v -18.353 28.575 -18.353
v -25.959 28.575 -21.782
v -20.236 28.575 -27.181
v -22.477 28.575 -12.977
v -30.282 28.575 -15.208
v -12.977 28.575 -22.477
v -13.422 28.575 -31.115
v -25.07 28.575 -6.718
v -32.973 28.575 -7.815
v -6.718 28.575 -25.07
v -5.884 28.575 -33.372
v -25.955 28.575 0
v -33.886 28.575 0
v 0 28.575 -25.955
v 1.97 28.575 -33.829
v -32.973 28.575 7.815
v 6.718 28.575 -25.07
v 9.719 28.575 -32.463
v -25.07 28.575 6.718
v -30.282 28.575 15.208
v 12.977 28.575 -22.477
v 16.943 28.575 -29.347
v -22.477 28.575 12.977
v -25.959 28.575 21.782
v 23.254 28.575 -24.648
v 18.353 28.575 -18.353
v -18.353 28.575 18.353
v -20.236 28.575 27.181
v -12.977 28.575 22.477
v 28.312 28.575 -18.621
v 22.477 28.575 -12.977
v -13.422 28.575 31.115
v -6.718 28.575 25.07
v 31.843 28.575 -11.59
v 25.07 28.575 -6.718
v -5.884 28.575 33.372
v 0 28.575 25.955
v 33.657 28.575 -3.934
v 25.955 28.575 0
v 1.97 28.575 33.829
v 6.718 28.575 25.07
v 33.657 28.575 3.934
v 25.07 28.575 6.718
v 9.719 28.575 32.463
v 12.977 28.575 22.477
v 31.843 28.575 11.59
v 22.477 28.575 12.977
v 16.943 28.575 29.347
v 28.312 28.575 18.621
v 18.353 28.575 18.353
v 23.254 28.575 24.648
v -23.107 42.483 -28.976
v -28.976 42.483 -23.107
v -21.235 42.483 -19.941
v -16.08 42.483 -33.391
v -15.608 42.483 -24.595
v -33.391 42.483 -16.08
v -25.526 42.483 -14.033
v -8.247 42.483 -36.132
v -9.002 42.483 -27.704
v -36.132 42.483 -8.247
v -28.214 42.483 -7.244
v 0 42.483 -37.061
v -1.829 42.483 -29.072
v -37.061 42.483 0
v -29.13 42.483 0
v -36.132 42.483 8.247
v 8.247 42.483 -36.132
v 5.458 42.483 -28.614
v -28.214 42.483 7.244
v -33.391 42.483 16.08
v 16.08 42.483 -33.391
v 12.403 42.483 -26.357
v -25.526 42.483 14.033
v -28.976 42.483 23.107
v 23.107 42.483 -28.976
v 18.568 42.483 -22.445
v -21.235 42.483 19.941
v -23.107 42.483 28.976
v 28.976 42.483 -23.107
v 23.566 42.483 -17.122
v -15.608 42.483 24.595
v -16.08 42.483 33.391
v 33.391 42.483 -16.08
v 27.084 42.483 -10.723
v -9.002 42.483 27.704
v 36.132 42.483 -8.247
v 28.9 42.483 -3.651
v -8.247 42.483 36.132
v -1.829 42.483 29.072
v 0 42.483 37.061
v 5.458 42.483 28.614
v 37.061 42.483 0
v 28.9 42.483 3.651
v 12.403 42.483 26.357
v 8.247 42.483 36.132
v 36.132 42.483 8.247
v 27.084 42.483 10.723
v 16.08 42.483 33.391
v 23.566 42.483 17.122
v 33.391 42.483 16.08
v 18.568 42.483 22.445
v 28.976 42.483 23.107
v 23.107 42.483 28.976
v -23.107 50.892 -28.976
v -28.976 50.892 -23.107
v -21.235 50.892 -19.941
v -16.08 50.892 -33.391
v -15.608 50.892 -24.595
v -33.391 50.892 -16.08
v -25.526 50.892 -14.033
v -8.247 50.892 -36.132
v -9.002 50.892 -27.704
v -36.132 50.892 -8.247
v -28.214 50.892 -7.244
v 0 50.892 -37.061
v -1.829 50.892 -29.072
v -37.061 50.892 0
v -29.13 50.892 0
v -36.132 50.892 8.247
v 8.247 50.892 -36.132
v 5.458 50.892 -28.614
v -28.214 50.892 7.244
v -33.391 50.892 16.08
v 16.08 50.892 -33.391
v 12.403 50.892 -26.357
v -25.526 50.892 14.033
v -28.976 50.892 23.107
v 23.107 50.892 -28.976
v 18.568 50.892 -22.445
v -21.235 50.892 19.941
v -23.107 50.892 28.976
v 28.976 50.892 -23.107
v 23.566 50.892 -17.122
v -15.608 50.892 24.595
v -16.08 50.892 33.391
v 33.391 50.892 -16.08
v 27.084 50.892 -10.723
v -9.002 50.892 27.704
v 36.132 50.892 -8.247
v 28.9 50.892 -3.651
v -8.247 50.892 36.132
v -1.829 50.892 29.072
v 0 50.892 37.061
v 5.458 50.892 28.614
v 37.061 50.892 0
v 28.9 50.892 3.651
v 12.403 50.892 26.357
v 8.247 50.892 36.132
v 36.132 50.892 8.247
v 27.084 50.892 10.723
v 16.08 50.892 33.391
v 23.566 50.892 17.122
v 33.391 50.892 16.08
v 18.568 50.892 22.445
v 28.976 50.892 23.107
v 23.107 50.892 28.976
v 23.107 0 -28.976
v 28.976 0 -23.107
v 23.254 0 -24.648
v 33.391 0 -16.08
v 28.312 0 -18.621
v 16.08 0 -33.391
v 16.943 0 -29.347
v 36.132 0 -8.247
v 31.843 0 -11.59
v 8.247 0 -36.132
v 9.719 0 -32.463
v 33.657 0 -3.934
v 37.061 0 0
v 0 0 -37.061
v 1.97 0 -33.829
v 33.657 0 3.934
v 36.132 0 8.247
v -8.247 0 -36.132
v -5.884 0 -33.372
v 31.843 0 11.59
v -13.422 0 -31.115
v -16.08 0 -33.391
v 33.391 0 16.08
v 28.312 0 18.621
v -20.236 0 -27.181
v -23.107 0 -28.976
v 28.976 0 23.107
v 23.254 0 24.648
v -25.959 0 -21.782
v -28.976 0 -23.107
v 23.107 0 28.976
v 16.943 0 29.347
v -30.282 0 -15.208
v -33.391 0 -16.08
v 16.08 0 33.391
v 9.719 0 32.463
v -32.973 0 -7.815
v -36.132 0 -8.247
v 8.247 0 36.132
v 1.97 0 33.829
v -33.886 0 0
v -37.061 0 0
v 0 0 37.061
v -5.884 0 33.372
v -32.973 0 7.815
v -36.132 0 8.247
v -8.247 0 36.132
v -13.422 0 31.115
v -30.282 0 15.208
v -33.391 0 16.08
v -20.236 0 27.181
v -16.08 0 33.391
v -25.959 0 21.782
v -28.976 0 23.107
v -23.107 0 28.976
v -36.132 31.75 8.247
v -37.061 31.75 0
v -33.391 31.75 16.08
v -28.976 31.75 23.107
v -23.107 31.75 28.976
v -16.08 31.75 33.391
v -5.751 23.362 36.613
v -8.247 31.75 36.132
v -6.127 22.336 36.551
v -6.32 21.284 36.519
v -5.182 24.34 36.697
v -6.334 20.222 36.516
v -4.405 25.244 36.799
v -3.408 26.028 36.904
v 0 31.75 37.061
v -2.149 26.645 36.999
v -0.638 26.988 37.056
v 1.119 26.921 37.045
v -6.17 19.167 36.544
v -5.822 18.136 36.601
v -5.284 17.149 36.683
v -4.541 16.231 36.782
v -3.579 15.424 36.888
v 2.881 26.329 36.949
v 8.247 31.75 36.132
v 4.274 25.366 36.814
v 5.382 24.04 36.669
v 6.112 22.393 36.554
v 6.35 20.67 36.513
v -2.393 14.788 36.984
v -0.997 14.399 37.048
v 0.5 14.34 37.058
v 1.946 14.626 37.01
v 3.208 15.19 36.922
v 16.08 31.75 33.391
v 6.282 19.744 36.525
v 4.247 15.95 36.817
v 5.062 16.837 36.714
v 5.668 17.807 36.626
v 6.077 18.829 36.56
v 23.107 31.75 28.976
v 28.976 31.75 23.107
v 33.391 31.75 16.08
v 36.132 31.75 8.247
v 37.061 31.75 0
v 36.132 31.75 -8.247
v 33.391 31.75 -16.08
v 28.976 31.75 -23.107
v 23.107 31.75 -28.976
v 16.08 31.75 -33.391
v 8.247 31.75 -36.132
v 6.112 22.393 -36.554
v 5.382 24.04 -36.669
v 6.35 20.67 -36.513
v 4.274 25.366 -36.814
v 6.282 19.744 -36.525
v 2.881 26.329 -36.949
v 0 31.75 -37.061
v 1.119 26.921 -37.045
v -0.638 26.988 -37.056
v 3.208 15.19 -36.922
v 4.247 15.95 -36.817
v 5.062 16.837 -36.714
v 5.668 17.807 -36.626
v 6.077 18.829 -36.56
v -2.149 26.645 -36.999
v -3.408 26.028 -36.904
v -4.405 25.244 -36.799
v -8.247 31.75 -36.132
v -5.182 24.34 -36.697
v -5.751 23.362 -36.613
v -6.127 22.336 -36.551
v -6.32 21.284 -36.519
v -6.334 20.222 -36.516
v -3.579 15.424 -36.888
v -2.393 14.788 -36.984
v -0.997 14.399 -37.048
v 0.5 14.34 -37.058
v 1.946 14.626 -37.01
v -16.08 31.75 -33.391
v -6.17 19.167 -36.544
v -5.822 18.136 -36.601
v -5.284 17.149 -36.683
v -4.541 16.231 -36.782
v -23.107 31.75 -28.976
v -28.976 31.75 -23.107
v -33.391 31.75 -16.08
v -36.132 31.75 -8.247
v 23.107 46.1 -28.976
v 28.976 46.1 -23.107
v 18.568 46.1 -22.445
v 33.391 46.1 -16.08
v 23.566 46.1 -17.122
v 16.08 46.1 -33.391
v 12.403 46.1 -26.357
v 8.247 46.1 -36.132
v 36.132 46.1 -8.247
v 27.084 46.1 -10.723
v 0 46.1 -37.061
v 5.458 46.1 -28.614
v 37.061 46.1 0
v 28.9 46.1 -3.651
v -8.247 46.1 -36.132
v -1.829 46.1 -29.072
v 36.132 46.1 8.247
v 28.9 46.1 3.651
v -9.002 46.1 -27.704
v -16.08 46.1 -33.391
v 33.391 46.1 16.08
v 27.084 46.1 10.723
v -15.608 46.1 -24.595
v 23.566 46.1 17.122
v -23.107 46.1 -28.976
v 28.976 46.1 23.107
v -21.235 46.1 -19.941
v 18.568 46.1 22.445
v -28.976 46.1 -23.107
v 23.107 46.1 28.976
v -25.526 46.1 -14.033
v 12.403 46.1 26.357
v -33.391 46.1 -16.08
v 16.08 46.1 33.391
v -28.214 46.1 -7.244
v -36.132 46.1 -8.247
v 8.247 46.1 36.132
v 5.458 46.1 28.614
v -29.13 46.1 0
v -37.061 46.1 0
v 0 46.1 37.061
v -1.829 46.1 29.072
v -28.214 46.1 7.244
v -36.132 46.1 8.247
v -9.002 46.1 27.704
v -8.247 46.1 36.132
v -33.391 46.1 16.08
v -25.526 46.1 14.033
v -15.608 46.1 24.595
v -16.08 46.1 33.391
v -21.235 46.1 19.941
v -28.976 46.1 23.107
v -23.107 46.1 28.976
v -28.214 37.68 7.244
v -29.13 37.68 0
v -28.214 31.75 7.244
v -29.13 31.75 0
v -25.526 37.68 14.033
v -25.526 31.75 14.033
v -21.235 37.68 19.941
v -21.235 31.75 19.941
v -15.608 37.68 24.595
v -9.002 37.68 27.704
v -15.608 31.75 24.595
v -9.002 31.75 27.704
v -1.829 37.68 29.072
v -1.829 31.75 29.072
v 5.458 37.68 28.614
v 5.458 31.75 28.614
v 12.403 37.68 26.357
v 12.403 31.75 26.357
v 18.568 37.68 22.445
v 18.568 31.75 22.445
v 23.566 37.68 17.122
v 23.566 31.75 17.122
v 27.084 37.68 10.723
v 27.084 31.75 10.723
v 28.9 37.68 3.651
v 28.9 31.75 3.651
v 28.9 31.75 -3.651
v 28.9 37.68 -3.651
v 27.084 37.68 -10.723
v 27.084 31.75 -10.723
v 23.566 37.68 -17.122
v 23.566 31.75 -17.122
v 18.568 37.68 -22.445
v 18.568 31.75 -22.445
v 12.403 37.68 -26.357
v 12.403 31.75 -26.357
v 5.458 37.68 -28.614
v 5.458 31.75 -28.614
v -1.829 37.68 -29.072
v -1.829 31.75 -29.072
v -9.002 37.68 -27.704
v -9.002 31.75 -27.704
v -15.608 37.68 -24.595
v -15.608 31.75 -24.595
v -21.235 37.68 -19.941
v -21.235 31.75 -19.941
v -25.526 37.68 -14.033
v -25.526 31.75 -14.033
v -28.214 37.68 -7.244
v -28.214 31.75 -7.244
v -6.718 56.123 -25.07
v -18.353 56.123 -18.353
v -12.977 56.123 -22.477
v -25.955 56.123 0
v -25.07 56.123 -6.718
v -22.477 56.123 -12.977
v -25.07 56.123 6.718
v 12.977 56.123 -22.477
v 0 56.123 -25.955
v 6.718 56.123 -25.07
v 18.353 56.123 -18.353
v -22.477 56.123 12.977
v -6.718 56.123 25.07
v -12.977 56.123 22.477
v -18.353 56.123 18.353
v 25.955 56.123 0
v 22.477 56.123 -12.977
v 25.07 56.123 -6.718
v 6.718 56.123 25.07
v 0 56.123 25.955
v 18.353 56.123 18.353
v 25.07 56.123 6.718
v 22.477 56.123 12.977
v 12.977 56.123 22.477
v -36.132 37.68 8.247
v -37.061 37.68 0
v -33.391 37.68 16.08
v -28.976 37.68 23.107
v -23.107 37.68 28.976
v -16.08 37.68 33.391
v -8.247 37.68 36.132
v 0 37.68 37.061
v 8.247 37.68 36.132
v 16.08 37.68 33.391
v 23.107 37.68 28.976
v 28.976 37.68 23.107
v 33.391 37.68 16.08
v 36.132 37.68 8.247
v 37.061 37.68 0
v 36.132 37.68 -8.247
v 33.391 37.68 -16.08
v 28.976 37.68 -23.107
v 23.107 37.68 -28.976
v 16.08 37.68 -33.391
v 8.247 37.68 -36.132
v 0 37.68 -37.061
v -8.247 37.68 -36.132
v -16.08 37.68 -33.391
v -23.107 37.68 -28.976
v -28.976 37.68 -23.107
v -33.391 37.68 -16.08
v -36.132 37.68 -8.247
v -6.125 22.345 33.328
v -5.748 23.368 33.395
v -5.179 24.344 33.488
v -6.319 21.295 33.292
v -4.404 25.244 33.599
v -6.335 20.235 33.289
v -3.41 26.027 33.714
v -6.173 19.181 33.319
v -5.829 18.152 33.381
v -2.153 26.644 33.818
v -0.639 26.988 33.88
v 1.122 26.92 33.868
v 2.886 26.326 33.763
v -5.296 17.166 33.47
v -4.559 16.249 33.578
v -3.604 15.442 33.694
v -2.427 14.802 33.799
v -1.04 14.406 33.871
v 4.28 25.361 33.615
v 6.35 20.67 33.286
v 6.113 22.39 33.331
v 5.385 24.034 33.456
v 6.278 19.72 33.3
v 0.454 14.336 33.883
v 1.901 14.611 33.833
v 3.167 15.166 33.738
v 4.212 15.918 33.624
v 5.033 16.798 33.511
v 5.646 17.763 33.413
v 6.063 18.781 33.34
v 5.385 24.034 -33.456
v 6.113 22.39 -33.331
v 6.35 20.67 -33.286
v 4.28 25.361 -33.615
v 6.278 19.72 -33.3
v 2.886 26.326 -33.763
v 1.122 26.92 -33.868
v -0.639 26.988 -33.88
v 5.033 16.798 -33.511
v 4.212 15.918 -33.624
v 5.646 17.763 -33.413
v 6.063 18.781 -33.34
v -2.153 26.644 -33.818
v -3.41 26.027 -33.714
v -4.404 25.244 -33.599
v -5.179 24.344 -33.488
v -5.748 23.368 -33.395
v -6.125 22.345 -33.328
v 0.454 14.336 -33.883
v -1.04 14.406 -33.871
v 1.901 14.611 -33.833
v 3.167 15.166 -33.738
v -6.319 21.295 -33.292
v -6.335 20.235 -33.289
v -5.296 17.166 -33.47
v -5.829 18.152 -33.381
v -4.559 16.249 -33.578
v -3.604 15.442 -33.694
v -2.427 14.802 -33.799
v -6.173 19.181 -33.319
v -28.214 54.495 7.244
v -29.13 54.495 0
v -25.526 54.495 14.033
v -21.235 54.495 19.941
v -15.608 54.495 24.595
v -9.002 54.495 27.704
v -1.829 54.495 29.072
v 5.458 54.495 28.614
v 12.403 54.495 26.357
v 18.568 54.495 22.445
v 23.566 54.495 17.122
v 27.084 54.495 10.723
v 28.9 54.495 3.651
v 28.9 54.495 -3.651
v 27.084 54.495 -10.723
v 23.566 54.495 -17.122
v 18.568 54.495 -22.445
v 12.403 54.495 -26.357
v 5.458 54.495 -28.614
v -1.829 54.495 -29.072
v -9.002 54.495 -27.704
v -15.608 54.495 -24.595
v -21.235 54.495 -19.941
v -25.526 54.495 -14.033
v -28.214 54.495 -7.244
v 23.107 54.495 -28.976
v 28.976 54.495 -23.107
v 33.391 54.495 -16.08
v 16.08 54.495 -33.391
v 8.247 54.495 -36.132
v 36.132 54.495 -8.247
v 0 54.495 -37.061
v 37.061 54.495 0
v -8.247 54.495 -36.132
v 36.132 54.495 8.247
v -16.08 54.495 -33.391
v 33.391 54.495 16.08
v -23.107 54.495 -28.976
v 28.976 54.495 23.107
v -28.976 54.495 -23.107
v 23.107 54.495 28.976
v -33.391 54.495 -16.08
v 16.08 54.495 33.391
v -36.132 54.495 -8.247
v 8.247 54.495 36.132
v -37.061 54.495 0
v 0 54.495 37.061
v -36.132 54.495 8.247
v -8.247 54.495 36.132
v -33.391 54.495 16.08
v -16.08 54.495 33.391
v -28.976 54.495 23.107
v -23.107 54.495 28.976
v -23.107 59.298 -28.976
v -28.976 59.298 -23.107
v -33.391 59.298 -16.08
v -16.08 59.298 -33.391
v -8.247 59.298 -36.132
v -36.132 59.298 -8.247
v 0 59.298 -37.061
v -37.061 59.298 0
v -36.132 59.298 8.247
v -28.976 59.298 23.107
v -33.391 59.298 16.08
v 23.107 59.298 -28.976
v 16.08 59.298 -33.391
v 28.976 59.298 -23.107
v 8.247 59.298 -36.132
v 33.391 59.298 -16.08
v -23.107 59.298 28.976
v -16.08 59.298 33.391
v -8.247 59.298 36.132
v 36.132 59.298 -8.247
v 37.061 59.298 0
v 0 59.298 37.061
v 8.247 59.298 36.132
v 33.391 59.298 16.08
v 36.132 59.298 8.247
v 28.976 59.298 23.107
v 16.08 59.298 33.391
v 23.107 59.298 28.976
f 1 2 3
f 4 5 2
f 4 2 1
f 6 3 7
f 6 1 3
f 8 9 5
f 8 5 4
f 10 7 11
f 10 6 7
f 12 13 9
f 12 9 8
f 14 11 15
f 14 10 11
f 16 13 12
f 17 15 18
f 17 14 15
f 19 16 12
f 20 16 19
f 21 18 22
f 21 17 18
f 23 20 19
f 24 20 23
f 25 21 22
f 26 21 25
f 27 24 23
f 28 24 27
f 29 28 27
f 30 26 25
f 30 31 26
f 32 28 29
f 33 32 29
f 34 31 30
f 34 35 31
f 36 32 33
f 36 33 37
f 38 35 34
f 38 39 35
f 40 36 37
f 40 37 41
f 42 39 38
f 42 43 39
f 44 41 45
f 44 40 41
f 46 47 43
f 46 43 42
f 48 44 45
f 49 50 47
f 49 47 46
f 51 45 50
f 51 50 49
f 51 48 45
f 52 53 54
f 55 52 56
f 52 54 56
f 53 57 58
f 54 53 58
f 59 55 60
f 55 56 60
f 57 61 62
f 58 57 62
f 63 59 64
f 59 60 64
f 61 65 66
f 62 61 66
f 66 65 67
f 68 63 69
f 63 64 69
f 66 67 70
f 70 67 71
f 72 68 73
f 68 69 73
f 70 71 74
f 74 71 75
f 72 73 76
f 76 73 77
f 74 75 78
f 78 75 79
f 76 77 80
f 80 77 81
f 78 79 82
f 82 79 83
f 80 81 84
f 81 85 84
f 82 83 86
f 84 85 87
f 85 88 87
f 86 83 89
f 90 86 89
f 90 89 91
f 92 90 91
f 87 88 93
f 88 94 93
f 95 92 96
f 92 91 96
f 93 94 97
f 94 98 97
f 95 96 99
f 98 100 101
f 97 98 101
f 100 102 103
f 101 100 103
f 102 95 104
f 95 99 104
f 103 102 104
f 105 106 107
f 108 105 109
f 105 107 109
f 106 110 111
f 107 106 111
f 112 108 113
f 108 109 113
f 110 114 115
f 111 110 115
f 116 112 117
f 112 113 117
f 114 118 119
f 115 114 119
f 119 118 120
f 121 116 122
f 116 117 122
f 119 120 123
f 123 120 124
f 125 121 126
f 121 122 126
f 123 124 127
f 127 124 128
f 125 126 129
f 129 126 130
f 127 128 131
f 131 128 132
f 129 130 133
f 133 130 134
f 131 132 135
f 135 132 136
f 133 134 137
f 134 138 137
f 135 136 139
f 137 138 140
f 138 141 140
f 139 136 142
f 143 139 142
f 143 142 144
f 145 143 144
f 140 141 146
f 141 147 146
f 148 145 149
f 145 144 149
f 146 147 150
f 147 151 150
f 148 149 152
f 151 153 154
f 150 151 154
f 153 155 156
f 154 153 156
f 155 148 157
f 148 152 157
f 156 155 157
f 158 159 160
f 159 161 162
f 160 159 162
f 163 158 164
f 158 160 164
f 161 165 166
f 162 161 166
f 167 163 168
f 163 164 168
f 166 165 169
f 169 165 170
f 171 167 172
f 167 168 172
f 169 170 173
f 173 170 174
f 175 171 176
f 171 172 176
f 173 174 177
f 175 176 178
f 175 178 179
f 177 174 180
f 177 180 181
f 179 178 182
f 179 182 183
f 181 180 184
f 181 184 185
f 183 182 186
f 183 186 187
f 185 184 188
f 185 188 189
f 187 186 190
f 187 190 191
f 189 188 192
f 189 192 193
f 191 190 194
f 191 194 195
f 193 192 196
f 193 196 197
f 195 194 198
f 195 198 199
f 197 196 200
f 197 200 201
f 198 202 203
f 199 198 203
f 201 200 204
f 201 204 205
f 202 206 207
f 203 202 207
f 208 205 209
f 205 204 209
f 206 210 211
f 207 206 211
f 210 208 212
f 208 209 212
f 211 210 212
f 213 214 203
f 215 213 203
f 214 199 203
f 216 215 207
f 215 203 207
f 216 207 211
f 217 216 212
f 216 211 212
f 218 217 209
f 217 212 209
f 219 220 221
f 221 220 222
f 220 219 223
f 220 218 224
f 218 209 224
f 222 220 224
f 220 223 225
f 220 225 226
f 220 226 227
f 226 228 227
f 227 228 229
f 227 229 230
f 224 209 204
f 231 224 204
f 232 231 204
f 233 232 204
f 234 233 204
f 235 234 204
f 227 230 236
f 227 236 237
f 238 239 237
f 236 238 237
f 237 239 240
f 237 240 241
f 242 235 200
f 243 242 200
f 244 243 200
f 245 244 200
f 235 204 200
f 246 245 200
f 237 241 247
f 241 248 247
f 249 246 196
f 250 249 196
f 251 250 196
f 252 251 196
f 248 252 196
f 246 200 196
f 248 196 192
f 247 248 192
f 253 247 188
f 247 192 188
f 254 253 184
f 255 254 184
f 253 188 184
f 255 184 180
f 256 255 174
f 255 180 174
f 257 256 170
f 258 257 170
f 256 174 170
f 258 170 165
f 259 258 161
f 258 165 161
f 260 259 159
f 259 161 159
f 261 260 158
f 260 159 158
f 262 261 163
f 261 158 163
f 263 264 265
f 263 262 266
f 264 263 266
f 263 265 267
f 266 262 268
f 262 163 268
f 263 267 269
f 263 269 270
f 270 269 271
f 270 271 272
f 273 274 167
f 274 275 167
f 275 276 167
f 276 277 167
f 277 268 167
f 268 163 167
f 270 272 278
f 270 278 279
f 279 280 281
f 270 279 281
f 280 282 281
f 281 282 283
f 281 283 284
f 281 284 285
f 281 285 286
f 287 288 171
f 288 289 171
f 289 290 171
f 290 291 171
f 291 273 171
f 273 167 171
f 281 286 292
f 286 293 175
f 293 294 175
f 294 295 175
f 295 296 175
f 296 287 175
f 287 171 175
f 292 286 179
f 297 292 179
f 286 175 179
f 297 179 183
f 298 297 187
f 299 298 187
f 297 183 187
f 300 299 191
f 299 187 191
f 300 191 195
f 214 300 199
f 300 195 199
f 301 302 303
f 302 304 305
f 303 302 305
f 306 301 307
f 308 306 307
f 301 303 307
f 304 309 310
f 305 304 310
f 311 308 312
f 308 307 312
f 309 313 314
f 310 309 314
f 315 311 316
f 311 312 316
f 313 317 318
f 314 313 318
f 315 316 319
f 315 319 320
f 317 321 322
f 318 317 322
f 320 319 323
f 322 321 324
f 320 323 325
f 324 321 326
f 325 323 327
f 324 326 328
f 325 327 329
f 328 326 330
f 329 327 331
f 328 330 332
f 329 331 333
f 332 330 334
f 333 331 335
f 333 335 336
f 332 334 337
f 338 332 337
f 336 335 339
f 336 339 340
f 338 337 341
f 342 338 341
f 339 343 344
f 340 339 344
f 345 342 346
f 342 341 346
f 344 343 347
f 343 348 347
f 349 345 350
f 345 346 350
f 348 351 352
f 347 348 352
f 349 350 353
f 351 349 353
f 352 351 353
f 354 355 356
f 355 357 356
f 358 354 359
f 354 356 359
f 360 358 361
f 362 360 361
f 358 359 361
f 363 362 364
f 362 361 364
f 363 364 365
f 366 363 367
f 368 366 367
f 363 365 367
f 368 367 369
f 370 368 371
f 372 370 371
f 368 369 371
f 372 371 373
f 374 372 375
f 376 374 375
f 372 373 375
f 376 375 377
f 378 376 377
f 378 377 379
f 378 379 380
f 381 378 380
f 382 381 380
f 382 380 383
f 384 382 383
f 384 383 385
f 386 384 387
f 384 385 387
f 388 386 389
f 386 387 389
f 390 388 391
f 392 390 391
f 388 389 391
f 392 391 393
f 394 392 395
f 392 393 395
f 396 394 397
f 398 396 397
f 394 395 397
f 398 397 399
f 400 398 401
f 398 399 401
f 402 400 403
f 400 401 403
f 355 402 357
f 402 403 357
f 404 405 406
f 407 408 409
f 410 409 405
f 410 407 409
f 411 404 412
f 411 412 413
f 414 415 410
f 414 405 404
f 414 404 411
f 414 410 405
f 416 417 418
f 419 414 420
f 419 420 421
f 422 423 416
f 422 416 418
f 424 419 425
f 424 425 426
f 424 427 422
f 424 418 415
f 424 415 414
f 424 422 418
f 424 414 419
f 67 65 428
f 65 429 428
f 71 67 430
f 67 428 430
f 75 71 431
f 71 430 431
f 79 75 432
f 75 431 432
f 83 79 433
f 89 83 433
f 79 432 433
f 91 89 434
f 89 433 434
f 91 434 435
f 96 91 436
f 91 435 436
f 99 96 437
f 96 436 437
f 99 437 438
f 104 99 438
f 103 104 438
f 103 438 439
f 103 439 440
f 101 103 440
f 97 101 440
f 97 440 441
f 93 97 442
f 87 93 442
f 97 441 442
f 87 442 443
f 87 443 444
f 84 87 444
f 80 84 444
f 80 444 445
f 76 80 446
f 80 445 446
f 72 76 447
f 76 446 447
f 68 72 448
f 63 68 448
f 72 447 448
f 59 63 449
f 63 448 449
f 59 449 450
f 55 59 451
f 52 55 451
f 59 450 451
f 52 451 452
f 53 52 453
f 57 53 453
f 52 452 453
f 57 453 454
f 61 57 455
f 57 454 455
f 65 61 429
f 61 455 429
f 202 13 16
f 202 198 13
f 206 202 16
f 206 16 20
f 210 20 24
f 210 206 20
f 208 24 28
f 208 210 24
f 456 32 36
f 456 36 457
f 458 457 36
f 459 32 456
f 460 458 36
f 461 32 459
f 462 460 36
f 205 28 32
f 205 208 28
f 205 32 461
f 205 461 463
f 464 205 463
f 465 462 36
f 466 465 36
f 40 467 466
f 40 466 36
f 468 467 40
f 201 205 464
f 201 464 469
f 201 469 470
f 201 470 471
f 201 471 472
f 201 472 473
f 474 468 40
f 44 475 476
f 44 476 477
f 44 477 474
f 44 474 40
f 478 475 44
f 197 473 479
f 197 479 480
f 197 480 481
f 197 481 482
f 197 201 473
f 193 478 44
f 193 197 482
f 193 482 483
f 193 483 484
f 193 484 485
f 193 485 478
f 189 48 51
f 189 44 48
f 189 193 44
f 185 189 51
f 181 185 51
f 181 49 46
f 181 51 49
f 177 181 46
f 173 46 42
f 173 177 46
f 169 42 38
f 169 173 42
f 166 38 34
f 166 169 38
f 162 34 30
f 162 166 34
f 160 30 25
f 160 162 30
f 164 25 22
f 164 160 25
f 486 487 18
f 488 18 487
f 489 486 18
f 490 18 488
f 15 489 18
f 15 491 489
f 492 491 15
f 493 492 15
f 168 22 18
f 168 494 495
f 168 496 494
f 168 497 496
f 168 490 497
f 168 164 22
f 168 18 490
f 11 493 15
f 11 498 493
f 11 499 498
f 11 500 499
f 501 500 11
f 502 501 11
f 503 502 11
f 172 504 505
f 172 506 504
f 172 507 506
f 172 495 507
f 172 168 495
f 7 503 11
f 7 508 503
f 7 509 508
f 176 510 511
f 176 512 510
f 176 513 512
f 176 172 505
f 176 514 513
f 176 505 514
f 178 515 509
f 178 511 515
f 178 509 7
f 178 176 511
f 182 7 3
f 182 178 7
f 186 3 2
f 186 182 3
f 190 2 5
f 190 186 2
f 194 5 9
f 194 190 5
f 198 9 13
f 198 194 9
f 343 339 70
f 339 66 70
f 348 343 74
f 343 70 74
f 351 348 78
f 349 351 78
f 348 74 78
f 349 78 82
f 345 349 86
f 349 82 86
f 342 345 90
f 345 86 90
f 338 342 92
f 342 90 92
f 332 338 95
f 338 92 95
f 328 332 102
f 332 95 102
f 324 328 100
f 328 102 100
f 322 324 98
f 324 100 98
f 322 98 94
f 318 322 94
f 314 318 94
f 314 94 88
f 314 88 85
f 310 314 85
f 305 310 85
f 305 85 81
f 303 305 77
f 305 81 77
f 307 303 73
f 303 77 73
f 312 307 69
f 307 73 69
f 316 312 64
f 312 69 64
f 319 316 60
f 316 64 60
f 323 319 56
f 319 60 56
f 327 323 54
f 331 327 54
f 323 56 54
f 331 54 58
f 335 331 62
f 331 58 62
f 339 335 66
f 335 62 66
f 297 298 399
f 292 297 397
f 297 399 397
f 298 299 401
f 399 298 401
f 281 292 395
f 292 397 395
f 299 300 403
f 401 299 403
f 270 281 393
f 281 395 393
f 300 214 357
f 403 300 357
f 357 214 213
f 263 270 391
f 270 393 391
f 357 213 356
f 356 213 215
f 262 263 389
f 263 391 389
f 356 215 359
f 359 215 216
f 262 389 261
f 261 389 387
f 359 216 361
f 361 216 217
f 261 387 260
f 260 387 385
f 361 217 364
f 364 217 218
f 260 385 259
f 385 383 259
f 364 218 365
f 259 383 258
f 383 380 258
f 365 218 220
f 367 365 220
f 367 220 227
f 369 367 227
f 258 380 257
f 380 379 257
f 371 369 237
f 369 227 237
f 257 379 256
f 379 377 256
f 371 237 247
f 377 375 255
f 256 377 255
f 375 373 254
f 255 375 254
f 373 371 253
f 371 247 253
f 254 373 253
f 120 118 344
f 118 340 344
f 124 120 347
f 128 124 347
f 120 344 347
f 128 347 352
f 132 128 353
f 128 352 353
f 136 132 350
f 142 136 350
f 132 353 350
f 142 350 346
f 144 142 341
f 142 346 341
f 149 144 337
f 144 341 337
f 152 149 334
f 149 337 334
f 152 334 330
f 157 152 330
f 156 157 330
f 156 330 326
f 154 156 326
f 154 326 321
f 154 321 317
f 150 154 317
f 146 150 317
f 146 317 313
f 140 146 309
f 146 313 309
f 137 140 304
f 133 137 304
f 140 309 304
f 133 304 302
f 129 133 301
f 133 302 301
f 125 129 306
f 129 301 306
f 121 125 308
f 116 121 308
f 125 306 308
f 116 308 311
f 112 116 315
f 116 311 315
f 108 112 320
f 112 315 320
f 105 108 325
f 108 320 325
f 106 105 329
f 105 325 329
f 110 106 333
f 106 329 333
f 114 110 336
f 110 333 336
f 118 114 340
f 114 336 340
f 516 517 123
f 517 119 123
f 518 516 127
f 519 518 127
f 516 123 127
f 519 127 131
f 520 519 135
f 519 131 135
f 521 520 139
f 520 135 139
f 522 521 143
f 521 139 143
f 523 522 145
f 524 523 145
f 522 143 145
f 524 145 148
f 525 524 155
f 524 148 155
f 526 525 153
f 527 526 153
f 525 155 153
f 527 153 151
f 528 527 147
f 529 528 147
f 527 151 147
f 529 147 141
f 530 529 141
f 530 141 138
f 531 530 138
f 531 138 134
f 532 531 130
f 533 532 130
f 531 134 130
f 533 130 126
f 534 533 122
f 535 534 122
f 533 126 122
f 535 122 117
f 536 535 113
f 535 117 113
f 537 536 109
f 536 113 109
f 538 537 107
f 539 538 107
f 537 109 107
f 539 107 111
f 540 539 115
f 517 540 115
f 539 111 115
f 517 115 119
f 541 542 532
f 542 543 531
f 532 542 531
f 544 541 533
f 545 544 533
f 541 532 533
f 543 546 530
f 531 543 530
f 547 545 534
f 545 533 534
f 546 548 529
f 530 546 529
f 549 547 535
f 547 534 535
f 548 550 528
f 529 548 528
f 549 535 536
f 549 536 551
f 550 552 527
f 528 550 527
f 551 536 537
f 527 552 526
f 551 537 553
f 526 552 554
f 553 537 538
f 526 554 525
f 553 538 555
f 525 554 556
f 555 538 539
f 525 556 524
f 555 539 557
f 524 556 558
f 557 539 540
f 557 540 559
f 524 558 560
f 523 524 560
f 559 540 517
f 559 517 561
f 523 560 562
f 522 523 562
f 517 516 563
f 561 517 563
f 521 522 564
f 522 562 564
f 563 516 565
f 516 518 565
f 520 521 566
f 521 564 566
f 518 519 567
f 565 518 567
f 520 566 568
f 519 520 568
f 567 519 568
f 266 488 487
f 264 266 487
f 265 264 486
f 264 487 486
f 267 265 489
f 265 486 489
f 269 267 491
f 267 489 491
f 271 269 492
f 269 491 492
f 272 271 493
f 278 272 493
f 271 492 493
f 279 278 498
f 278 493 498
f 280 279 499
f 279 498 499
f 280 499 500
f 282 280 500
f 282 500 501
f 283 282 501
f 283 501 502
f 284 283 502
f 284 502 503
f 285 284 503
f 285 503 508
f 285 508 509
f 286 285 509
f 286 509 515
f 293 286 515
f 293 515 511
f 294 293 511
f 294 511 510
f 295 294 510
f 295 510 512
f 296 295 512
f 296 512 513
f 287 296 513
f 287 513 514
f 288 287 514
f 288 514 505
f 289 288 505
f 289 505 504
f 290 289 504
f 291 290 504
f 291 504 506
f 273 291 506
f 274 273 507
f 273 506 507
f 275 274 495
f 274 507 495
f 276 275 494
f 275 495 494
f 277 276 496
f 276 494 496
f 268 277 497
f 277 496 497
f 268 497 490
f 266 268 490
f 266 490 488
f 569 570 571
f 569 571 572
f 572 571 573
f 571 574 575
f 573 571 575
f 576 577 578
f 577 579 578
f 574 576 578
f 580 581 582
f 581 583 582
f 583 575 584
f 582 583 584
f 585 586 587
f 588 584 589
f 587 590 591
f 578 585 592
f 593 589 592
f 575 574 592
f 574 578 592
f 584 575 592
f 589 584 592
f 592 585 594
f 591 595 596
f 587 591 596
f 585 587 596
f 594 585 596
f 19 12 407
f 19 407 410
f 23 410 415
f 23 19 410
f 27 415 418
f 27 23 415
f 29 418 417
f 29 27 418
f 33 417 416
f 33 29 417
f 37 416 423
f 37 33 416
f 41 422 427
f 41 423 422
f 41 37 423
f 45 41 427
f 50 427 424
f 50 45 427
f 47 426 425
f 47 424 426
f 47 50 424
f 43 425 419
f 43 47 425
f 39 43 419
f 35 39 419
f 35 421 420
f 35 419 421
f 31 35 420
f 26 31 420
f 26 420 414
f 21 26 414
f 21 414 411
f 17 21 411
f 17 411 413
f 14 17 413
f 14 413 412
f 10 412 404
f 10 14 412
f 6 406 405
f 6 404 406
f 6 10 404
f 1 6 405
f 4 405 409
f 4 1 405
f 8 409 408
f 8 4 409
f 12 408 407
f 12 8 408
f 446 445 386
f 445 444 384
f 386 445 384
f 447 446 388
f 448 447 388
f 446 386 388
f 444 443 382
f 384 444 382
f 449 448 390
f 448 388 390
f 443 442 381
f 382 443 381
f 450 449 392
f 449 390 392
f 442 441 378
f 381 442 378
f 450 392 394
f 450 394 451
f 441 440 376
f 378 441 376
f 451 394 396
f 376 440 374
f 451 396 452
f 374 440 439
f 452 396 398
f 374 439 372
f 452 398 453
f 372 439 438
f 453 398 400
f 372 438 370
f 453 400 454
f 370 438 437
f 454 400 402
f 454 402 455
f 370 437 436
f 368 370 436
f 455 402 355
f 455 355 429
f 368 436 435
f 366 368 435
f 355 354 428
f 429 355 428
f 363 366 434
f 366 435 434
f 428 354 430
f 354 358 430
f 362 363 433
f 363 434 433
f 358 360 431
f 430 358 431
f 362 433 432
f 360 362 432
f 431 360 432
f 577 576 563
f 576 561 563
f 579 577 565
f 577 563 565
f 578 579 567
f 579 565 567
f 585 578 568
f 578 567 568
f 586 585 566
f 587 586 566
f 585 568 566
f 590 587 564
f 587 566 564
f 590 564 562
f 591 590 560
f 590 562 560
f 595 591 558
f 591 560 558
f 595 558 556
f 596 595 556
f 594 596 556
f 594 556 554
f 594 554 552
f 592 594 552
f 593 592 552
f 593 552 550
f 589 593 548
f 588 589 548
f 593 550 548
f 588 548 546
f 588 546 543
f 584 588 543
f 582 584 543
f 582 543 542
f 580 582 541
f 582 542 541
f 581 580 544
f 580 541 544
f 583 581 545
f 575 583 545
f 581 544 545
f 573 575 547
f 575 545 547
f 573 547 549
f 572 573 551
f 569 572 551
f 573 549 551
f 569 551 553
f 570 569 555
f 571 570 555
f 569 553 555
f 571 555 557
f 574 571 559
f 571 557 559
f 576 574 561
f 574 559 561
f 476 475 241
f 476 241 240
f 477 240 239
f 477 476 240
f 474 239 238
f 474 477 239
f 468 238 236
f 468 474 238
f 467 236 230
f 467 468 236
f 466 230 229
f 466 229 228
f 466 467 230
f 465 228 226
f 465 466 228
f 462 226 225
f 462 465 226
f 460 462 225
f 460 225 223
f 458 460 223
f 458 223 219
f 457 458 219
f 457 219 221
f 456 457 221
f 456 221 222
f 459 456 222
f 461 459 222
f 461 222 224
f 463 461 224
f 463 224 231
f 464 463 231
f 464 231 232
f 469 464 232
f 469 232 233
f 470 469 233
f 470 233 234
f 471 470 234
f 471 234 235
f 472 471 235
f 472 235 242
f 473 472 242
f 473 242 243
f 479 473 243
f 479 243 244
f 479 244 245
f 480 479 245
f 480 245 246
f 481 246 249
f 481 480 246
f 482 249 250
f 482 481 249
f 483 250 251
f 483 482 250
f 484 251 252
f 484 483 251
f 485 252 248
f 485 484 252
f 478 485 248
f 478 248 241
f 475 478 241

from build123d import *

# Parameters (mm, degrees)
F2_T     = 3.175
F3_R     = 6.35
F4_DEPTH = 64.008
F5_DEPTH = 104.14


# Not quite as in the source:
# - a shell that OpenCascade refuses in one call is made with other operations: the cavity is built on its own and cut out


with BuildPart() as f1:
    # F0 (on Top) → F1 (revolve)
    with BuildSketch(Plane.XY):
        Polygon((-37.0614958425, 0), (0, 0), (0, 59.2983933481), (-37.0614958425, 59.2983933481), (-37.0614958425, 54.4952234869), (-29.1296224819, 54.4952234869), (-29.1296224819, 50.8915618087), (-37.0614958425, 50.8915618087), (-37.0614958425, 46.1002111902), (-29.1296224819, 46.1002111902), (-29.1296224819, 42.483009196), (-37.0614958425, 42.483009196), (-37.0614958425, 37.6798393348), (-29.1296224819, 37.6798393348), (-29.1296224819, 31.75), (-37.0614958425, 31.75), align=None)
    revolve(axis=Axis((0, 29.649196674, 0), (0, 1, 0)))

    # F2: shell of thickness 3.175, made by hand


with BuildPart() as f2_core1:
    # F2_t2: copy of F1
    add(f1.part)

    # the walls: a layer under each face that stays
    f2_faces = [f2_core1.faces().sort_by_distance(p)[0] for p in [
        (29.1296224819, 34.7149196674, 0),
        (-24.707663895, 31.75, -24.707663895),
        (37.0614958425, 15.875, 0),
        (0, 59.2983933481, 0),
        (37.0614958425, 56.8968084175, 0),
        (24.707663895, 54.4952234869, -24.707663895),
        (29.1296224819, 52.6933926478, 0),
        (-24.707663895, 50.8915618087, -24.707663895),
        (37.0614958425, 48.4958864995, 0),
        (24.707663895, 46.1002111902, -24.707663895),
        (29.1296224819, 44.2916101931, 0),
        (-24.707663895, 42.483009196, -24.707663895),
        (37.0614958425, 40.0814242654, 0),
        (24.707663895, 37.6798393348, -24.707663895),
    ]]
    thicken(f2_faces, amount=-F2_T, mode=Mode.SUBTRACT)

    # F2_s3 → F2_t4 (revolve, cut)
    with BuildSketch(Plane.XY):
        Polygon((-29.1613724819, 37.6480893348), (-25.9546224819, 37.6798393348), (-25.9546224819, 40.8548393348), (-29.1296224819, 40.8548393348), align=None)
    revolve(axis=Axis((0, 37.6798393348, 0), (0, 1, 0)), mode=Mode.SUBTRACT)

    # F2_s5 → F2_t6 (revolve, cut)
    with BuildSketch(Plane.XY):
        Polygon((-29.1613724819, 31.78175), (-25.9546224819, 31.75), (-25.9546224819, 28.575), (-29.1296224819, 28.575), align=None)
    revolve(axis=Axis((0, 31.75, 0), (0, 1, 0)), mode=Mode.SUBTRACT)

    # F2_s7 → F2_t8 (revolve, cut)
    with BuildSketch(Plane.XY):
        Polygon((-29.1613724819, 54.4634734869), (-29.1296224819, 57.6702234869), (-25.9546224819, 57.6702234869), (-25.9546224819, 54.4952234869), align=None)
    revolve(axis=Axis((0, 54.4952234869, 0), (0, 1, 0)), mode=Mode.SUBTRACT)

    # F2_s9 → F2_t10 (revolve, cut)
    with BuildSketch(Plane.XY):
        Polygon((-29.1613724819, 50.9233118087), (-25.9546224819, 50.8915618087), (-25.9546224819, 47.7165618087), (-29.1296224819, 47.7165618087), align=None)
    revolve(axis=Axis((0, 50.8915618087, 0), (0, 1, 0)), mode=Mode.SUBTRACT)

    # F2_s11 → F2_t12 (revolve, cut)
    with BuildSketch(Plane.XY):
        Polygon((-29.1613724819, 46.0684611902), (-29.1296224819, 49.2752111902), (-25.9546224819, 49.2752111902), (-25.9546224819, 46.1002111902), align=None)
    revolve(axis=Axis((0, 46.1002111902, 0), (0, 1, 0)), mode=Mode.SUBTRACT)

    # F2_s13 → F2_t14 (revolve, cut)
    with BuildSketch(Plane.XY):
        Polygon((-29.1613724819, 42.514759196), (-25.9546224819, 42.483009196), (-25.9546224819, 39.308009196), (-29.1296224819, 39.308009196), align=None)
    revolve(axis=Axis((0, 42.483009196, 0), (0, 1, 0)), mode=Mode.SUBTRACT)


with BuildPart() as f1_1:
    add(f1.part)

    # what is left inside the walls is the cavity
    f2_cavity = [f2_core1.part.solids().sort_by_distance(p)[0] for p in [
        (33.854746, 19.05, 0),
    ]]
    add(f2_cavity, mode=Mode.SUBTRACT)

    # F3 (on Top) → F4 (cut)
    with BuildSketch(Plane.XY):
        with Locations((0, 20.6699799746)):
            Circle(F3_R)
    extrude(amount=-F4_DEPTH, mode=Mode.SUBTRACT)

    # F3 (on Top) → F5 (cut)
    with BuildSketch(Plane.XY):
        with Locations((0, 20.6699799746)):
            Circle(F3_R)
    extrude(amount=F5_DEPTH, mode=Mode.SUBTRACT)


solid = f1_1.part
